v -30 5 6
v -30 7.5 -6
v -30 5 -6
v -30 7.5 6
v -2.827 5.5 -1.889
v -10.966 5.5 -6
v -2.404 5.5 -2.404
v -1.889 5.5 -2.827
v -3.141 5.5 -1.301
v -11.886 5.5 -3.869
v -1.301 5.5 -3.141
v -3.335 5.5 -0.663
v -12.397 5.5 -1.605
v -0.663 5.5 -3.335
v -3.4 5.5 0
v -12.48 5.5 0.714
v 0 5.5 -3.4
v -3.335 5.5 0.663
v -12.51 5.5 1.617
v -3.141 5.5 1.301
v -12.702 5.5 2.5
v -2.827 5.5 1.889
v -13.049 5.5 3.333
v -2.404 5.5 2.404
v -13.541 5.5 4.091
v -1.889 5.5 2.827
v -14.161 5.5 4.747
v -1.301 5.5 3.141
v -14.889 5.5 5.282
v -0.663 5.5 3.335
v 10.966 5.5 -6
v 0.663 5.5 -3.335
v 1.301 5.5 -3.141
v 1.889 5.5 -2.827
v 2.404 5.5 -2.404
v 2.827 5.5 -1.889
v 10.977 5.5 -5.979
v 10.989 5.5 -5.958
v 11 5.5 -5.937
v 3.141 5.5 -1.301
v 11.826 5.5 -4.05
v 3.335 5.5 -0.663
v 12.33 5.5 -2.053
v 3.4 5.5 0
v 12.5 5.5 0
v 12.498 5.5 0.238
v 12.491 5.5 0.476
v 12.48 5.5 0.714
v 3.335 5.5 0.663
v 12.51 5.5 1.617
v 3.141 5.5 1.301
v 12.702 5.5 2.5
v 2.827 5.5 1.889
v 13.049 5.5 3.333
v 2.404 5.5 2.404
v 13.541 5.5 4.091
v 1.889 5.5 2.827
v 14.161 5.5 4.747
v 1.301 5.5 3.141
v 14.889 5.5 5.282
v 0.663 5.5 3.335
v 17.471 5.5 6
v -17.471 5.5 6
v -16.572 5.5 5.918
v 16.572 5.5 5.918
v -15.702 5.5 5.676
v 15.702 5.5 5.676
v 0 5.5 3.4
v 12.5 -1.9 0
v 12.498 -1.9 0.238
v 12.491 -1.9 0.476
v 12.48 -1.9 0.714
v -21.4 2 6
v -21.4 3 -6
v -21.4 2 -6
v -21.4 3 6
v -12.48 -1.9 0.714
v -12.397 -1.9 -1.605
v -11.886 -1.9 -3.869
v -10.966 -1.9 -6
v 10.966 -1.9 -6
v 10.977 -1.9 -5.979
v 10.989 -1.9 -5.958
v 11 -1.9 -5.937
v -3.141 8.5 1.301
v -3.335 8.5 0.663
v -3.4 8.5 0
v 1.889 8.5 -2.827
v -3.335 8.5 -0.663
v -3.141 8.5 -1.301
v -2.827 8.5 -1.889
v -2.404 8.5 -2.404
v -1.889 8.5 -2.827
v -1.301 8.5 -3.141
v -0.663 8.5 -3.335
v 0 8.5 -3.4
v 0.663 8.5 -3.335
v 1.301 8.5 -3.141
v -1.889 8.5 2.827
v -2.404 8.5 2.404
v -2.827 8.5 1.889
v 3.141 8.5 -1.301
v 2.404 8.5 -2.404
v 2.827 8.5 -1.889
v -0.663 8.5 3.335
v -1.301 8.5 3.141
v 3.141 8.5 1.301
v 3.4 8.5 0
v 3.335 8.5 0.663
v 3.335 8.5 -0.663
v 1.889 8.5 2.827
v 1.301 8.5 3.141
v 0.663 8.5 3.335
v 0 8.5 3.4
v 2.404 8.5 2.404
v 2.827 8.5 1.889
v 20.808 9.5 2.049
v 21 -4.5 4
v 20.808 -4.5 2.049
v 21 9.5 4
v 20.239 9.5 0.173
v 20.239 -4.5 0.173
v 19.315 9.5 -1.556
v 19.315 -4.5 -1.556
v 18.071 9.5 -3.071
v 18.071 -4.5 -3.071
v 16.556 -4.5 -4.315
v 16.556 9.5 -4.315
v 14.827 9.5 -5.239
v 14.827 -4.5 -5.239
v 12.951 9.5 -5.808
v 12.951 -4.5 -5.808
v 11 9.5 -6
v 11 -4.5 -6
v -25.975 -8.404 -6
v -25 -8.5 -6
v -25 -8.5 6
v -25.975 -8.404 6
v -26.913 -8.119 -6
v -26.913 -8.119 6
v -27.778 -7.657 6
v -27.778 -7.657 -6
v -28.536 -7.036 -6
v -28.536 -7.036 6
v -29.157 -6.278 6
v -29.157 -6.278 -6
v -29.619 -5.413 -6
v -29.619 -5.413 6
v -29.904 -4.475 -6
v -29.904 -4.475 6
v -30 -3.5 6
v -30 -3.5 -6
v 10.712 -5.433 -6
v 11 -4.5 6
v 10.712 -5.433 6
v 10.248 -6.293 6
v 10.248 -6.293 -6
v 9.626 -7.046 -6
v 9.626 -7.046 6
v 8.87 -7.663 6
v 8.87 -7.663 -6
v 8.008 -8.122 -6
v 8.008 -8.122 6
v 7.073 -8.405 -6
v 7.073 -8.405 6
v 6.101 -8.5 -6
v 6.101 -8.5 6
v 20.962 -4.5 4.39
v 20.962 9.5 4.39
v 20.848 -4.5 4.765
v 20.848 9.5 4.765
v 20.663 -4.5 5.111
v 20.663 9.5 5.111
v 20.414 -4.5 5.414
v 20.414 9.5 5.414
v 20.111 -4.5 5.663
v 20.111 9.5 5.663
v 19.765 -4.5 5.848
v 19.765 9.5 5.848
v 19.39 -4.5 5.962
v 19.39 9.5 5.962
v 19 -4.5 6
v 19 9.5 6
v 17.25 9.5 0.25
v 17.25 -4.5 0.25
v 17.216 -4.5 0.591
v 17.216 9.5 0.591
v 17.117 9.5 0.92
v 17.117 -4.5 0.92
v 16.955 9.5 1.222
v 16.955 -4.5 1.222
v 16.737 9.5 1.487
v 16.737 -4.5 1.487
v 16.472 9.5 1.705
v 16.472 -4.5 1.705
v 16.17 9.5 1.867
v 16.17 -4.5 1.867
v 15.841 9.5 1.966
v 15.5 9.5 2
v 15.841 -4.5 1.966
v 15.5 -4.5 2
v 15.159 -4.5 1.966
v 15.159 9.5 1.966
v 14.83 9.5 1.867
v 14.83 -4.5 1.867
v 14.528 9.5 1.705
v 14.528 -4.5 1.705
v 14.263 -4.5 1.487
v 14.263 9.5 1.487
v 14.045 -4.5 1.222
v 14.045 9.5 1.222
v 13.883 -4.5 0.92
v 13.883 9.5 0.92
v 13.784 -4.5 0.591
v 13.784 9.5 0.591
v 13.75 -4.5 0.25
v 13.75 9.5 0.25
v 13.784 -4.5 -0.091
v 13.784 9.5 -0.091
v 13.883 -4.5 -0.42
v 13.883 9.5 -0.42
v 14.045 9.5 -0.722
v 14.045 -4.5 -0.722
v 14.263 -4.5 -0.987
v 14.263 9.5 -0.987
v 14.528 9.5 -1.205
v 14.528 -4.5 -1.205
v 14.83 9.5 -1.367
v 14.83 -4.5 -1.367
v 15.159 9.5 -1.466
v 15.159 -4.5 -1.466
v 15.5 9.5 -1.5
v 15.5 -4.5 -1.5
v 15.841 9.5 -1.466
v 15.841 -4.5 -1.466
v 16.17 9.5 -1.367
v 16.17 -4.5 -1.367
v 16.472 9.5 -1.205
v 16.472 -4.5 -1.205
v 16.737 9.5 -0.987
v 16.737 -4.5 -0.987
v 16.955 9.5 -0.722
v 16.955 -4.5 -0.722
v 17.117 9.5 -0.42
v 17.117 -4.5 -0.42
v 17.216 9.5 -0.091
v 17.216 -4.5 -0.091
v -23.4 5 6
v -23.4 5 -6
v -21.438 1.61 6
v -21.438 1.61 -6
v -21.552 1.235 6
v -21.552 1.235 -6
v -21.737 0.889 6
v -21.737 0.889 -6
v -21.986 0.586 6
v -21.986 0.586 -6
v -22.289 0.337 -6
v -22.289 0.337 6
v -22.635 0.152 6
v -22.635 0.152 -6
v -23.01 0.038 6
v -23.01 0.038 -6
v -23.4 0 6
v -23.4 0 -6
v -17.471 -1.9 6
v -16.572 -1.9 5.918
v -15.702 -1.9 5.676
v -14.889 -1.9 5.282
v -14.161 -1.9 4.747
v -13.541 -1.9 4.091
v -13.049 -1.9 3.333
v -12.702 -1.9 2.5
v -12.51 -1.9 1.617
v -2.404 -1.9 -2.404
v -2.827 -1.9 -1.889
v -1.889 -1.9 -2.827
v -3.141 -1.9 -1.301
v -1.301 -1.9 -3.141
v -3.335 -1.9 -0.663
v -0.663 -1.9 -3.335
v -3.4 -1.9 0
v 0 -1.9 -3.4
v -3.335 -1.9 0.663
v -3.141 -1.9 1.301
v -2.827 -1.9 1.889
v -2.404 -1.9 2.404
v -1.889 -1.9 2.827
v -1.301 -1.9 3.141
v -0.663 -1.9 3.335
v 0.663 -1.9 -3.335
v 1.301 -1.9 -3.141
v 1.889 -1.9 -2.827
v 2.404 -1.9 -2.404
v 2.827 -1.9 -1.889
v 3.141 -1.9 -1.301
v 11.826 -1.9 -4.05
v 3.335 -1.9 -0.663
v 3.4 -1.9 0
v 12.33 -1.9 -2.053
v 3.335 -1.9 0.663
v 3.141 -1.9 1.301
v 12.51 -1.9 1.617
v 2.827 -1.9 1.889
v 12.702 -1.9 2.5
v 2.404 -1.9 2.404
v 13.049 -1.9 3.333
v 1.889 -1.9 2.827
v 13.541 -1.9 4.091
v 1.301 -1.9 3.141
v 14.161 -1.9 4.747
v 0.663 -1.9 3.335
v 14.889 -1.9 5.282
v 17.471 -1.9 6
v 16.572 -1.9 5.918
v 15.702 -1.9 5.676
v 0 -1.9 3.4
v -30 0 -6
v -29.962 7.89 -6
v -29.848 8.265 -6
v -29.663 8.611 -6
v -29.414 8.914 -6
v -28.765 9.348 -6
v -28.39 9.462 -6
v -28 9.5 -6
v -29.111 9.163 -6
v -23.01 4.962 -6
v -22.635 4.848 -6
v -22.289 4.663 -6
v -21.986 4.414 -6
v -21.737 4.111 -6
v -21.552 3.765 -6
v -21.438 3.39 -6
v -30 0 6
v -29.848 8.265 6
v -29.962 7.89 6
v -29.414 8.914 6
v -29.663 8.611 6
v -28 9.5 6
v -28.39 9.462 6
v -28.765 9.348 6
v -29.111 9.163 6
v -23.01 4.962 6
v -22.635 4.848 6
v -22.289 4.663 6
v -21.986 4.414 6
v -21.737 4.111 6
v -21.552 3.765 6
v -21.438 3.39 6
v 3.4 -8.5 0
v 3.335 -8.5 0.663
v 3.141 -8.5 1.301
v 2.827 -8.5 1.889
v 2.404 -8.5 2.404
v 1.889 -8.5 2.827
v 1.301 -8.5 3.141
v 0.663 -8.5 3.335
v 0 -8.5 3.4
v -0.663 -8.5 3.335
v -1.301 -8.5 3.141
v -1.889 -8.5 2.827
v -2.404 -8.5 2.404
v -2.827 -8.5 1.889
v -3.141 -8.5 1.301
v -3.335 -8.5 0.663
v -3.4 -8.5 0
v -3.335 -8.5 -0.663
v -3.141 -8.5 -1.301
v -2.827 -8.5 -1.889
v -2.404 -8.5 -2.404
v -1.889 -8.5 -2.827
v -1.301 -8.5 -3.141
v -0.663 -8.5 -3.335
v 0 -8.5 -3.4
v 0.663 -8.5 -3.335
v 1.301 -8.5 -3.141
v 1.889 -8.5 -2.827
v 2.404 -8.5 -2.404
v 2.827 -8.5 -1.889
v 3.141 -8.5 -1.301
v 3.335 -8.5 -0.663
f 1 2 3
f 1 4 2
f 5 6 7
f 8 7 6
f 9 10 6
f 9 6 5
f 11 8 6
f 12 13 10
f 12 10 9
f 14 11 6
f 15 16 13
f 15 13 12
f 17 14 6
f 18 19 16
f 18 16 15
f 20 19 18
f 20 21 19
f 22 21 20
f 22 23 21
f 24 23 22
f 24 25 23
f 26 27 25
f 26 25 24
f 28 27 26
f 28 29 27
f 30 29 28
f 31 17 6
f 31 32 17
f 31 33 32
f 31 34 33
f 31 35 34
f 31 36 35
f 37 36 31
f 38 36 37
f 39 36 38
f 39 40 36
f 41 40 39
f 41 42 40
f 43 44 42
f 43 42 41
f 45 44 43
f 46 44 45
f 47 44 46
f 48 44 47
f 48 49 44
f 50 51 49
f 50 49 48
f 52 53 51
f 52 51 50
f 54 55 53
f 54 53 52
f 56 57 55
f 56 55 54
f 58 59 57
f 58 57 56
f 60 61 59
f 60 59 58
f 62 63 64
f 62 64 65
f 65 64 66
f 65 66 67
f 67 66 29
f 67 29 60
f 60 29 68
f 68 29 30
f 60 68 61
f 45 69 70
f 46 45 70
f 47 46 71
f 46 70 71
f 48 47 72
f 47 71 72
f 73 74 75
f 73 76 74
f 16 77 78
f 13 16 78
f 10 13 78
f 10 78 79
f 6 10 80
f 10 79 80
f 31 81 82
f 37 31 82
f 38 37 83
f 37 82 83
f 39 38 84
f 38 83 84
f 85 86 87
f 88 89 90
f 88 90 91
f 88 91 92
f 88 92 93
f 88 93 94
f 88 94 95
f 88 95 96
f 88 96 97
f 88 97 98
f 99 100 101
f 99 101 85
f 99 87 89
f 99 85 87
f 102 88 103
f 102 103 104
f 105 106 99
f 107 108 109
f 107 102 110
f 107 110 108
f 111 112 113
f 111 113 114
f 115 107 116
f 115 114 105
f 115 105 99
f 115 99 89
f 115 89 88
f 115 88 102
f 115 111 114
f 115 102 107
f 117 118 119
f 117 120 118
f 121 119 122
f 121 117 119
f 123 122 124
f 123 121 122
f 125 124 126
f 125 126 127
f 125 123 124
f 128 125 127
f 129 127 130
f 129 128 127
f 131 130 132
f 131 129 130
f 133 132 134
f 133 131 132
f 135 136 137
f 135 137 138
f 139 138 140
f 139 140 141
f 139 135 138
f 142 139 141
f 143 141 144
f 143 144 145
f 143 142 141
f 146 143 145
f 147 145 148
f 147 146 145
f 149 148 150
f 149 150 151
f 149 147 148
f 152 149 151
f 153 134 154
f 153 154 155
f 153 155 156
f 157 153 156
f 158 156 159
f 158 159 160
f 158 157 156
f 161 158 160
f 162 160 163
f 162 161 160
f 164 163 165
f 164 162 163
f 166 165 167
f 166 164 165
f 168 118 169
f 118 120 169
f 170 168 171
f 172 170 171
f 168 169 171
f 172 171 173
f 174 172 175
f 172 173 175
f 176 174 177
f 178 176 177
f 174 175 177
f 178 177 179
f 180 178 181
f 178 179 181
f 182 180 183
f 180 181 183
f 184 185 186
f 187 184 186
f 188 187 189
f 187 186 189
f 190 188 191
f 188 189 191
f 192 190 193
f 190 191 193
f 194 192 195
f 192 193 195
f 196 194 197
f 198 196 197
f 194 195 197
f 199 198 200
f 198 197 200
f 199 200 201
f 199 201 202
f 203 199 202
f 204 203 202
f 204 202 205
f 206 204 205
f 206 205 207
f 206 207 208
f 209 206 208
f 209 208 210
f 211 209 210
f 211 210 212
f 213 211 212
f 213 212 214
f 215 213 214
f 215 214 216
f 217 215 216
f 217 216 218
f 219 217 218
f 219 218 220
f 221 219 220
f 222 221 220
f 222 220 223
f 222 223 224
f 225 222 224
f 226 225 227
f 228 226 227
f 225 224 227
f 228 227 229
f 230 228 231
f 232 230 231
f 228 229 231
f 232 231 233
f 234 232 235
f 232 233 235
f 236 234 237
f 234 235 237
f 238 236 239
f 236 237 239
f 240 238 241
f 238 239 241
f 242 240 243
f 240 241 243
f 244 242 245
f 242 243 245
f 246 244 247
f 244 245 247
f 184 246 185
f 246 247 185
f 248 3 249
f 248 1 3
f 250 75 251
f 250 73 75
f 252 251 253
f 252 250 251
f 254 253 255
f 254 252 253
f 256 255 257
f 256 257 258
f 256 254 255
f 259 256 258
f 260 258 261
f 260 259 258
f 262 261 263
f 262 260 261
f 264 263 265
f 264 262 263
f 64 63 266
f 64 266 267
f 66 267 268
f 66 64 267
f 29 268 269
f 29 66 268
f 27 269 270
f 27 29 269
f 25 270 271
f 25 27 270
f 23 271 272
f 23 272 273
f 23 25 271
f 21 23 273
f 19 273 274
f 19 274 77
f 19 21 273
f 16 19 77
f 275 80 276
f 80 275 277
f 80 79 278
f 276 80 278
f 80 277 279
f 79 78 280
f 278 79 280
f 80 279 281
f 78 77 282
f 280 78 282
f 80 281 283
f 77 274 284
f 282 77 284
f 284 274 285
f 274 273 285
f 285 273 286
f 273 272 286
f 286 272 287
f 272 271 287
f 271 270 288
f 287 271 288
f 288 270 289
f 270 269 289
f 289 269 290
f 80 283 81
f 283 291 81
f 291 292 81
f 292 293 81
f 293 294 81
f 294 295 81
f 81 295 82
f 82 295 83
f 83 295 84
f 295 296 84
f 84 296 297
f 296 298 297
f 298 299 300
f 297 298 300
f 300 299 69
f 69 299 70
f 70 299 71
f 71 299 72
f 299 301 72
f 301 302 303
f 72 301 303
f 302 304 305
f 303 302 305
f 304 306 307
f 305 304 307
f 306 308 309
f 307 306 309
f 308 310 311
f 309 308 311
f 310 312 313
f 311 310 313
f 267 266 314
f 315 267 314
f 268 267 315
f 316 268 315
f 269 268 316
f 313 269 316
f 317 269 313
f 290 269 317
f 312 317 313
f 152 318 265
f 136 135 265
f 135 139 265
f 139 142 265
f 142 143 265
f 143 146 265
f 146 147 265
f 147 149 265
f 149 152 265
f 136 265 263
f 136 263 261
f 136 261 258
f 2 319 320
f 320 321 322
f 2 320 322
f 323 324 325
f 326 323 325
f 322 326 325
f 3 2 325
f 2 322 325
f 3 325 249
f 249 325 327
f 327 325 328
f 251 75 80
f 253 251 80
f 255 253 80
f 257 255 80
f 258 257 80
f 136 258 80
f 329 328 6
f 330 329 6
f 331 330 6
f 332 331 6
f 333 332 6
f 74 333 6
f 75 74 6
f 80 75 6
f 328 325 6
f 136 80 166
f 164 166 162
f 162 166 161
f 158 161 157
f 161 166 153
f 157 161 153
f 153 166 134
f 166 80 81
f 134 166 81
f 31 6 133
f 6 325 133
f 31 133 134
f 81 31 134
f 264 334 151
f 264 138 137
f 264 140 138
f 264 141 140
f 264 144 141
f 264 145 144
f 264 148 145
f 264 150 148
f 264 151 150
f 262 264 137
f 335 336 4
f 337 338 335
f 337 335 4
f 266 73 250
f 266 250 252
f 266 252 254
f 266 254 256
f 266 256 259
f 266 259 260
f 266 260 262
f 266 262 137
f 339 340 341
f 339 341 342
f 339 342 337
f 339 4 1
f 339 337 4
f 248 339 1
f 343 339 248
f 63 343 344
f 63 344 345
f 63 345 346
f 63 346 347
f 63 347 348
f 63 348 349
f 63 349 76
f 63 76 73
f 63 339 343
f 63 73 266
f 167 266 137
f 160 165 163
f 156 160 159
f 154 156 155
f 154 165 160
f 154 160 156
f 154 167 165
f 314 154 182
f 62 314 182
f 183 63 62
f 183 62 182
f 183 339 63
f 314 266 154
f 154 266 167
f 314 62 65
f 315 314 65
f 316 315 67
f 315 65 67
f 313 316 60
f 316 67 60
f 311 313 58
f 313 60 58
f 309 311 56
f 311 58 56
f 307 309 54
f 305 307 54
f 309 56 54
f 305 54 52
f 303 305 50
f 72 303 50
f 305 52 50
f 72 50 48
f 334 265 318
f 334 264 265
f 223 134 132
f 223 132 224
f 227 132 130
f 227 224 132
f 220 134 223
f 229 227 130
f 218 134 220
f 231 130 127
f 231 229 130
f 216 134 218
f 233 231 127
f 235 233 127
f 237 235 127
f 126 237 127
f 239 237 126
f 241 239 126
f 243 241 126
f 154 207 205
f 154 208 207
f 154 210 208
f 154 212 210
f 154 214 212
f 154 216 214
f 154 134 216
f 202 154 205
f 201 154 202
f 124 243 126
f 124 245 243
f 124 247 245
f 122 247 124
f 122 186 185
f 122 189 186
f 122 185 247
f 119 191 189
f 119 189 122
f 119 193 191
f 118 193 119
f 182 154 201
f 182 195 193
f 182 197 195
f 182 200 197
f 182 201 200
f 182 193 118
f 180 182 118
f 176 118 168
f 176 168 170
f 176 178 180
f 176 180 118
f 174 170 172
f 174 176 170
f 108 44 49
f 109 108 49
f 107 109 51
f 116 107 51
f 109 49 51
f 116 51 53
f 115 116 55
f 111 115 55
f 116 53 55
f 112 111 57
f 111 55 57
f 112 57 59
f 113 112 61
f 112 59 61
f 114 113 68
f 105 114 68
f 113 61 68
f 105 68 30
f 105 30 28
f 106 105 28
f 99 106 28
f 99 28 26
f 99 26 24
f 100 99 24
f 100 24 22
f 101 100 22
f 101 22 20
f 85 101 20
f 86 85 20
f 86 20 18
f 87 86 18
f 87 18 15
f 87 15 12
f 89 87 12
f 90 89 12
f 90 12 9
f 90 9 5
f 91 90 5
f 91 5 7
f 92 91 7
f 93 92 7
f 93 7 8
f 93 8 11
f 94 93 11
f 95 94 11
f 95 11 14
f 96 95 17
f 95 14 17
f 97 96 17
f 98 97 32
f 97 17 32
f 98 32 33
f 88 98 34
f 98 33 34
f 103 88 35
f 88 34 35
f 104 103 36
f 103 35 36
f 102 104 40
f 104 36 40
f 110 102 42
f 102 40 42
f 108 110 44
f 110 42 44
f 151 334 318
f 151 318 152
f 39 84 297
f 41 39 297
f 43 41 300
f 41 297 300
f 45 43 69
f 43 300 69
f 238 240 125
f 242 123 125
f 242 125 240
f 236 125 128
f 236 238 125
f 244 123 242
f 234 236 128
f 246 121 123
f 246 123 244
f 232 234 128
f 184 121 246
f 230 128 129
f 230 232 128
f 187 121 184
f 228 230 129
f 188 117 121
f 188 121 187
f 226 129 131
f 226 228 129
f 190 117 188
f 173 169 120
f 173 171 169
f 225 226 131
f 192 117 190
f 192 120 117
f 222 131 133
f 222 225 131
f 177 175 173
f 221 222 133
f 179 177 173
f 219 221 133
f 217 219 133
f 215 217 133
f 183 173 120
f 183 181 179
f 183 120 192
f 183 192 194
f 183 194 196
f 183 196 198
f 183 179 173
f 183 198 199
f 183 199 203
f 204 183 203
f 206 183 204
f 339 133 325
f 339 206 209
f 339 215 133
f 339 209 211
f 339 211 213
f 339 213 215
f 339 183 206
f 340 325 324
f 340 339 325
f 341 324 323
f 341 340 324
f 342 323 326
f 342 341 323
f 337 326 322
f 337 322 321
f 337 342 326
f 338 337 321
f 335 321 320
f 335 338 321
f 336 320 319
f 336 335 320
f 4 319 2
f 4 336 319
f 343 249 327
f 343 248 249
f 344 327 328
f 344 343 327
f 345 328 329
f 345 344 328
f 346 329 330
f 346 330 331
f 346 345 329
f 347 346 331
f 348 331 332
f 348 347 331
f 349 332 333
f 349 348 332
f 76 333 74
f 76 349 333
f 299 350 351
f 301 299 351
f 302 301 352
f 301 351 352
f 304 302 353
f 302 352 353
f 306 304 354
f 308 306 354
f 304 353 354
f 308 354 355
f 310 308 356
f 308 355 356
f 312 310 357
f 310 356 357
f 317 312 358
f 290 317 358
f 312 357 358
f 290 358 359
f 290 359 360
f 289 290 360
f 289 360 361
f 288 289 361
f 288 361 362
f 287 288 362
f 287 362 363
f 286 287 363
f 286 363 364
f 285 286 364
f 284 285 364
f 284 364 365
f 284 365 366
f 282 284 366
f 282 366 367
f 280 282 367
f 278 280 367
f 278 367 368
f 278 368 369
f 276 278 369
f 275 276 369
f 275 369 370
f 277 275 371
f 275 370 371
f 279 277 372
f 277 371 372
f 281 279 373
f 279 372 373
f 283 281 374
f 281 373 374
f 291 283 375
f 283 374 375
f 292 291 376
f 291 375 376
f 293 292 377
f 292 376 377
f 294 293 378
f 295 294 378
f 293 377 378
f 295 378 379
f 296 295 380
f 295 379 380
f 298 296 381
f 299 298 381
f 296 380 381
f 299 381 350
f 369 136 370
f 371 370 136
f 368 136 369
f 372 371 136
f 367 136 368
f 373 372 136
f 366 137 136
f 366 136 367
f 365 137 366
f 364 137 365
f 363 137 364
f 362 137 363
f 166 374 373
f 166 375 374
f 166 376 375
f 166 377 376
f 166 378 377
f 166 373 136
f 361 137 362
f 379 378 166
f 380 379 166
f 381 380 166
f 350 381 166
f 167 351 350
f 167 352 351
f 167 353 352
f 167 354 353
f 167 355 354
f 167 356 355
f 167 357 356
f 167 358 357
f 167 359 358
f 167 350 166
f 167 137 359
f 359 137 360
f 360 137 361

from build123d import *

# Parameters (mm, degrees)
F0_W        = 41
F0_H        = 4
F1_DEPTH    = 6
F3_START    = -6.6
F2_R        = 3.4
F3_DEPTH    = 7.4
F4_T1_DEPTH = 37
F4_T3_DEPTH = 36.4948974279
F4_T5_DEPTH = 7.4
F4_T7_DEPTH = 7.4
F5_DEPTH    = 17
F6_R        = 10
F7_R        = 1.99999
F8_R        = 2
F2_R_2      = 1.75
F9_DEPTH    = 18.001


# Not quite as in the source:
# - a fillet or chamfer that OpenCascade refuses, or shapes differently, is made with other operations: its cross-section is extruded or revolved along the edge and cut away or added
# - a fillet or chamfer is up to 0.001 mm smaller than in the source, because OpenCascade refuses the exact size


with BuildPart() as f1:
    # F0 (on Top) → F1 (new body, symmetric)
    with BuildSketch(Plane.XY):
        Polygon((11, -4.5), (21, -4.5), (21, 9.5), (-30, 9.5), (-30, 5), (-21.4, 5), (-21.4, 0), (-30, 0), (-30, -4.5), align=None)
        with Locations((-9.5, -6.5)):
            Rectangle(F0_W, F0_H)
    extrude(amount=F1_DEPTH, both=True)

    # F2 (on face) → F3 (cut)
    with BuildSketch(Plane.XZ.offset(8.5).offset(F3_START)):
        with BuildLine():
            Line((11, -5.9371710435), (11, 5.9371710435))
            ThreePointArc((11, 5.9371710435), (10.9829729772, 5.9686099372), (10.9658560997, 6))
            Line((10.9658560997, 6), (-10.9658560997, 6))
            ThreePointArc((-10.9658560997, 6), (-12.5, 0), (-10.9658560997, -6))
            Line((-10.9658560997, -6), (10.9658560997, -6))
            ThreePointArc((10.9658560997, -6), (10.9829729772, -5.9686099372), (11, -5.9371710435))
        make_face()
        Circle(F2_R, mode=Mode.SUBTRACT)
        with BuildLine():
            ThreePointArc((11, -5.9371710435), (12.1191996435, -3.0618621785), (12.5, 0))
            ThreePointArc((12.5, 0), (12.1191996435, 3.0618621785), (11, 5.9371710435))
            Line((11, 5.9371710435), (11, -5.9371710435))
        make_face()
        Circle(F2_R)
    extrude(amount=-F3_DEPTH, mode=Mode.SUBTRACT)

    # F4: fillet of radius 5 on 4 edges, made by hand

    # F4_s2 → F4_t1 (cut)
    with BuildSketch(Plane.XY.offset(-18.5)):
        with BuildLine():
            ThreePointArc((-25, -8.5), (-28.5355339059, -7.0355339059), (-30, -3.5))
            Line((-30, -3.5), (-30, -8.5))
            Line((-30, -8.5), (-25, -8.5))
        make_face()
    extrude(amount=F4_T1_DEPTH, mode=Mode.SUBTRACT)

    # F4_s4 → F4_t3 (cut)
    with BuildSketch(Plane.XY.offset(-18.2474487139)):
        with BuildLine():
            ThreePointArc((11, -4.5), (9.2632981746, -7.3729833462), (6.1010205144, -8.5))
            Line((6.1010205144, -8.5), (11, -8.5))
            Line((11, -8.5), (11, -4.5))
        make_face()
    extrude(amount=F4_T3_DEPTH, mode=Mode.SUBTRACT)

    # F4_s6 → F4_t5 (cut)
    with BuildSketch(Plane.XZ.offset(-5.5)):
        with BuildLine():
            ThreePointArc((-17.4714052097, 6), (-13.8362593097, 4.4330328116), (-12.4795751498, 0.7142857143))
            ThreePointArc((-12.4795751498, 0.7142857143), (-12.0169361942, 3.4414015319), (-10.9658560997, 6))
            Line((-10.9658560997, 6), (-17.4714052097, 6))
        make_face()
    extrude(amount=F4_T5_DEPTH, mode=Mode.SUBTRACT)

    # F4_s8 → F4_t7 (cut)
    with BuildSketch(Plane.XZ.offset(-5.5)):
        with BuildLine():
            ThreePointArc((17.4714052097, 6), (13.8362593097, 4.4330328116), (12.4795751498, 0.7142857143))
            ThreePointArc((12.4795751498, 0.7142857143), (12.0169361943, 3.4414015319), (10.9658560997, 6))
            Line((10.9658560997, 6), (17.4714052097, 6))
        make_face()
    extrude(amount=F4_T7_DEPTH, mode=Mode.SUBTRACT)

    # F2 (on face) → F5 (cut, through all)
    with BuildSketch(Plane.XZ.offset(8.5)):
        Circle(F2_R)
    extrude(amount=-F5_DEPTH, mode=Mode.SUBTRACT)

    # F6
    f6_edges = [f1.edges().sort_by_distance(p)[0] for p in [
        (21, 2.5, -6),
    ]]
    fillet(f6_edges, radius=F6_R)

    # F7 (radius 2 in the source; OpenCascade refuses exactly that, so slightly less here)
    f7_edges = [f1.edges().sort_by_distance(p)[0] for p in [
        (21, 2.5, 6),
    ]]
    fillet(f7_edges, radius=F7_R)

    # F8
    f8_edges = [f1.edges().sort_by_distance(p)[0] for p in [
        (-30, 9.5, 0),
        (-21.4, 5, 0),
        (-21.4, 0, 0),
    ]]
    fillet(f8_edges, radius=F8_R)

    # F2 (on face) → F9 (cut, through all)
    with BuildSketch(Plane.XZ.offset(8.5)):
        with Locations((15.5, 0.25)):
            Circle(F2_R_2)
    extrude(amount=-F9_DEPTH, mode=Mode.SUBTRACT)


solid = f1.part
